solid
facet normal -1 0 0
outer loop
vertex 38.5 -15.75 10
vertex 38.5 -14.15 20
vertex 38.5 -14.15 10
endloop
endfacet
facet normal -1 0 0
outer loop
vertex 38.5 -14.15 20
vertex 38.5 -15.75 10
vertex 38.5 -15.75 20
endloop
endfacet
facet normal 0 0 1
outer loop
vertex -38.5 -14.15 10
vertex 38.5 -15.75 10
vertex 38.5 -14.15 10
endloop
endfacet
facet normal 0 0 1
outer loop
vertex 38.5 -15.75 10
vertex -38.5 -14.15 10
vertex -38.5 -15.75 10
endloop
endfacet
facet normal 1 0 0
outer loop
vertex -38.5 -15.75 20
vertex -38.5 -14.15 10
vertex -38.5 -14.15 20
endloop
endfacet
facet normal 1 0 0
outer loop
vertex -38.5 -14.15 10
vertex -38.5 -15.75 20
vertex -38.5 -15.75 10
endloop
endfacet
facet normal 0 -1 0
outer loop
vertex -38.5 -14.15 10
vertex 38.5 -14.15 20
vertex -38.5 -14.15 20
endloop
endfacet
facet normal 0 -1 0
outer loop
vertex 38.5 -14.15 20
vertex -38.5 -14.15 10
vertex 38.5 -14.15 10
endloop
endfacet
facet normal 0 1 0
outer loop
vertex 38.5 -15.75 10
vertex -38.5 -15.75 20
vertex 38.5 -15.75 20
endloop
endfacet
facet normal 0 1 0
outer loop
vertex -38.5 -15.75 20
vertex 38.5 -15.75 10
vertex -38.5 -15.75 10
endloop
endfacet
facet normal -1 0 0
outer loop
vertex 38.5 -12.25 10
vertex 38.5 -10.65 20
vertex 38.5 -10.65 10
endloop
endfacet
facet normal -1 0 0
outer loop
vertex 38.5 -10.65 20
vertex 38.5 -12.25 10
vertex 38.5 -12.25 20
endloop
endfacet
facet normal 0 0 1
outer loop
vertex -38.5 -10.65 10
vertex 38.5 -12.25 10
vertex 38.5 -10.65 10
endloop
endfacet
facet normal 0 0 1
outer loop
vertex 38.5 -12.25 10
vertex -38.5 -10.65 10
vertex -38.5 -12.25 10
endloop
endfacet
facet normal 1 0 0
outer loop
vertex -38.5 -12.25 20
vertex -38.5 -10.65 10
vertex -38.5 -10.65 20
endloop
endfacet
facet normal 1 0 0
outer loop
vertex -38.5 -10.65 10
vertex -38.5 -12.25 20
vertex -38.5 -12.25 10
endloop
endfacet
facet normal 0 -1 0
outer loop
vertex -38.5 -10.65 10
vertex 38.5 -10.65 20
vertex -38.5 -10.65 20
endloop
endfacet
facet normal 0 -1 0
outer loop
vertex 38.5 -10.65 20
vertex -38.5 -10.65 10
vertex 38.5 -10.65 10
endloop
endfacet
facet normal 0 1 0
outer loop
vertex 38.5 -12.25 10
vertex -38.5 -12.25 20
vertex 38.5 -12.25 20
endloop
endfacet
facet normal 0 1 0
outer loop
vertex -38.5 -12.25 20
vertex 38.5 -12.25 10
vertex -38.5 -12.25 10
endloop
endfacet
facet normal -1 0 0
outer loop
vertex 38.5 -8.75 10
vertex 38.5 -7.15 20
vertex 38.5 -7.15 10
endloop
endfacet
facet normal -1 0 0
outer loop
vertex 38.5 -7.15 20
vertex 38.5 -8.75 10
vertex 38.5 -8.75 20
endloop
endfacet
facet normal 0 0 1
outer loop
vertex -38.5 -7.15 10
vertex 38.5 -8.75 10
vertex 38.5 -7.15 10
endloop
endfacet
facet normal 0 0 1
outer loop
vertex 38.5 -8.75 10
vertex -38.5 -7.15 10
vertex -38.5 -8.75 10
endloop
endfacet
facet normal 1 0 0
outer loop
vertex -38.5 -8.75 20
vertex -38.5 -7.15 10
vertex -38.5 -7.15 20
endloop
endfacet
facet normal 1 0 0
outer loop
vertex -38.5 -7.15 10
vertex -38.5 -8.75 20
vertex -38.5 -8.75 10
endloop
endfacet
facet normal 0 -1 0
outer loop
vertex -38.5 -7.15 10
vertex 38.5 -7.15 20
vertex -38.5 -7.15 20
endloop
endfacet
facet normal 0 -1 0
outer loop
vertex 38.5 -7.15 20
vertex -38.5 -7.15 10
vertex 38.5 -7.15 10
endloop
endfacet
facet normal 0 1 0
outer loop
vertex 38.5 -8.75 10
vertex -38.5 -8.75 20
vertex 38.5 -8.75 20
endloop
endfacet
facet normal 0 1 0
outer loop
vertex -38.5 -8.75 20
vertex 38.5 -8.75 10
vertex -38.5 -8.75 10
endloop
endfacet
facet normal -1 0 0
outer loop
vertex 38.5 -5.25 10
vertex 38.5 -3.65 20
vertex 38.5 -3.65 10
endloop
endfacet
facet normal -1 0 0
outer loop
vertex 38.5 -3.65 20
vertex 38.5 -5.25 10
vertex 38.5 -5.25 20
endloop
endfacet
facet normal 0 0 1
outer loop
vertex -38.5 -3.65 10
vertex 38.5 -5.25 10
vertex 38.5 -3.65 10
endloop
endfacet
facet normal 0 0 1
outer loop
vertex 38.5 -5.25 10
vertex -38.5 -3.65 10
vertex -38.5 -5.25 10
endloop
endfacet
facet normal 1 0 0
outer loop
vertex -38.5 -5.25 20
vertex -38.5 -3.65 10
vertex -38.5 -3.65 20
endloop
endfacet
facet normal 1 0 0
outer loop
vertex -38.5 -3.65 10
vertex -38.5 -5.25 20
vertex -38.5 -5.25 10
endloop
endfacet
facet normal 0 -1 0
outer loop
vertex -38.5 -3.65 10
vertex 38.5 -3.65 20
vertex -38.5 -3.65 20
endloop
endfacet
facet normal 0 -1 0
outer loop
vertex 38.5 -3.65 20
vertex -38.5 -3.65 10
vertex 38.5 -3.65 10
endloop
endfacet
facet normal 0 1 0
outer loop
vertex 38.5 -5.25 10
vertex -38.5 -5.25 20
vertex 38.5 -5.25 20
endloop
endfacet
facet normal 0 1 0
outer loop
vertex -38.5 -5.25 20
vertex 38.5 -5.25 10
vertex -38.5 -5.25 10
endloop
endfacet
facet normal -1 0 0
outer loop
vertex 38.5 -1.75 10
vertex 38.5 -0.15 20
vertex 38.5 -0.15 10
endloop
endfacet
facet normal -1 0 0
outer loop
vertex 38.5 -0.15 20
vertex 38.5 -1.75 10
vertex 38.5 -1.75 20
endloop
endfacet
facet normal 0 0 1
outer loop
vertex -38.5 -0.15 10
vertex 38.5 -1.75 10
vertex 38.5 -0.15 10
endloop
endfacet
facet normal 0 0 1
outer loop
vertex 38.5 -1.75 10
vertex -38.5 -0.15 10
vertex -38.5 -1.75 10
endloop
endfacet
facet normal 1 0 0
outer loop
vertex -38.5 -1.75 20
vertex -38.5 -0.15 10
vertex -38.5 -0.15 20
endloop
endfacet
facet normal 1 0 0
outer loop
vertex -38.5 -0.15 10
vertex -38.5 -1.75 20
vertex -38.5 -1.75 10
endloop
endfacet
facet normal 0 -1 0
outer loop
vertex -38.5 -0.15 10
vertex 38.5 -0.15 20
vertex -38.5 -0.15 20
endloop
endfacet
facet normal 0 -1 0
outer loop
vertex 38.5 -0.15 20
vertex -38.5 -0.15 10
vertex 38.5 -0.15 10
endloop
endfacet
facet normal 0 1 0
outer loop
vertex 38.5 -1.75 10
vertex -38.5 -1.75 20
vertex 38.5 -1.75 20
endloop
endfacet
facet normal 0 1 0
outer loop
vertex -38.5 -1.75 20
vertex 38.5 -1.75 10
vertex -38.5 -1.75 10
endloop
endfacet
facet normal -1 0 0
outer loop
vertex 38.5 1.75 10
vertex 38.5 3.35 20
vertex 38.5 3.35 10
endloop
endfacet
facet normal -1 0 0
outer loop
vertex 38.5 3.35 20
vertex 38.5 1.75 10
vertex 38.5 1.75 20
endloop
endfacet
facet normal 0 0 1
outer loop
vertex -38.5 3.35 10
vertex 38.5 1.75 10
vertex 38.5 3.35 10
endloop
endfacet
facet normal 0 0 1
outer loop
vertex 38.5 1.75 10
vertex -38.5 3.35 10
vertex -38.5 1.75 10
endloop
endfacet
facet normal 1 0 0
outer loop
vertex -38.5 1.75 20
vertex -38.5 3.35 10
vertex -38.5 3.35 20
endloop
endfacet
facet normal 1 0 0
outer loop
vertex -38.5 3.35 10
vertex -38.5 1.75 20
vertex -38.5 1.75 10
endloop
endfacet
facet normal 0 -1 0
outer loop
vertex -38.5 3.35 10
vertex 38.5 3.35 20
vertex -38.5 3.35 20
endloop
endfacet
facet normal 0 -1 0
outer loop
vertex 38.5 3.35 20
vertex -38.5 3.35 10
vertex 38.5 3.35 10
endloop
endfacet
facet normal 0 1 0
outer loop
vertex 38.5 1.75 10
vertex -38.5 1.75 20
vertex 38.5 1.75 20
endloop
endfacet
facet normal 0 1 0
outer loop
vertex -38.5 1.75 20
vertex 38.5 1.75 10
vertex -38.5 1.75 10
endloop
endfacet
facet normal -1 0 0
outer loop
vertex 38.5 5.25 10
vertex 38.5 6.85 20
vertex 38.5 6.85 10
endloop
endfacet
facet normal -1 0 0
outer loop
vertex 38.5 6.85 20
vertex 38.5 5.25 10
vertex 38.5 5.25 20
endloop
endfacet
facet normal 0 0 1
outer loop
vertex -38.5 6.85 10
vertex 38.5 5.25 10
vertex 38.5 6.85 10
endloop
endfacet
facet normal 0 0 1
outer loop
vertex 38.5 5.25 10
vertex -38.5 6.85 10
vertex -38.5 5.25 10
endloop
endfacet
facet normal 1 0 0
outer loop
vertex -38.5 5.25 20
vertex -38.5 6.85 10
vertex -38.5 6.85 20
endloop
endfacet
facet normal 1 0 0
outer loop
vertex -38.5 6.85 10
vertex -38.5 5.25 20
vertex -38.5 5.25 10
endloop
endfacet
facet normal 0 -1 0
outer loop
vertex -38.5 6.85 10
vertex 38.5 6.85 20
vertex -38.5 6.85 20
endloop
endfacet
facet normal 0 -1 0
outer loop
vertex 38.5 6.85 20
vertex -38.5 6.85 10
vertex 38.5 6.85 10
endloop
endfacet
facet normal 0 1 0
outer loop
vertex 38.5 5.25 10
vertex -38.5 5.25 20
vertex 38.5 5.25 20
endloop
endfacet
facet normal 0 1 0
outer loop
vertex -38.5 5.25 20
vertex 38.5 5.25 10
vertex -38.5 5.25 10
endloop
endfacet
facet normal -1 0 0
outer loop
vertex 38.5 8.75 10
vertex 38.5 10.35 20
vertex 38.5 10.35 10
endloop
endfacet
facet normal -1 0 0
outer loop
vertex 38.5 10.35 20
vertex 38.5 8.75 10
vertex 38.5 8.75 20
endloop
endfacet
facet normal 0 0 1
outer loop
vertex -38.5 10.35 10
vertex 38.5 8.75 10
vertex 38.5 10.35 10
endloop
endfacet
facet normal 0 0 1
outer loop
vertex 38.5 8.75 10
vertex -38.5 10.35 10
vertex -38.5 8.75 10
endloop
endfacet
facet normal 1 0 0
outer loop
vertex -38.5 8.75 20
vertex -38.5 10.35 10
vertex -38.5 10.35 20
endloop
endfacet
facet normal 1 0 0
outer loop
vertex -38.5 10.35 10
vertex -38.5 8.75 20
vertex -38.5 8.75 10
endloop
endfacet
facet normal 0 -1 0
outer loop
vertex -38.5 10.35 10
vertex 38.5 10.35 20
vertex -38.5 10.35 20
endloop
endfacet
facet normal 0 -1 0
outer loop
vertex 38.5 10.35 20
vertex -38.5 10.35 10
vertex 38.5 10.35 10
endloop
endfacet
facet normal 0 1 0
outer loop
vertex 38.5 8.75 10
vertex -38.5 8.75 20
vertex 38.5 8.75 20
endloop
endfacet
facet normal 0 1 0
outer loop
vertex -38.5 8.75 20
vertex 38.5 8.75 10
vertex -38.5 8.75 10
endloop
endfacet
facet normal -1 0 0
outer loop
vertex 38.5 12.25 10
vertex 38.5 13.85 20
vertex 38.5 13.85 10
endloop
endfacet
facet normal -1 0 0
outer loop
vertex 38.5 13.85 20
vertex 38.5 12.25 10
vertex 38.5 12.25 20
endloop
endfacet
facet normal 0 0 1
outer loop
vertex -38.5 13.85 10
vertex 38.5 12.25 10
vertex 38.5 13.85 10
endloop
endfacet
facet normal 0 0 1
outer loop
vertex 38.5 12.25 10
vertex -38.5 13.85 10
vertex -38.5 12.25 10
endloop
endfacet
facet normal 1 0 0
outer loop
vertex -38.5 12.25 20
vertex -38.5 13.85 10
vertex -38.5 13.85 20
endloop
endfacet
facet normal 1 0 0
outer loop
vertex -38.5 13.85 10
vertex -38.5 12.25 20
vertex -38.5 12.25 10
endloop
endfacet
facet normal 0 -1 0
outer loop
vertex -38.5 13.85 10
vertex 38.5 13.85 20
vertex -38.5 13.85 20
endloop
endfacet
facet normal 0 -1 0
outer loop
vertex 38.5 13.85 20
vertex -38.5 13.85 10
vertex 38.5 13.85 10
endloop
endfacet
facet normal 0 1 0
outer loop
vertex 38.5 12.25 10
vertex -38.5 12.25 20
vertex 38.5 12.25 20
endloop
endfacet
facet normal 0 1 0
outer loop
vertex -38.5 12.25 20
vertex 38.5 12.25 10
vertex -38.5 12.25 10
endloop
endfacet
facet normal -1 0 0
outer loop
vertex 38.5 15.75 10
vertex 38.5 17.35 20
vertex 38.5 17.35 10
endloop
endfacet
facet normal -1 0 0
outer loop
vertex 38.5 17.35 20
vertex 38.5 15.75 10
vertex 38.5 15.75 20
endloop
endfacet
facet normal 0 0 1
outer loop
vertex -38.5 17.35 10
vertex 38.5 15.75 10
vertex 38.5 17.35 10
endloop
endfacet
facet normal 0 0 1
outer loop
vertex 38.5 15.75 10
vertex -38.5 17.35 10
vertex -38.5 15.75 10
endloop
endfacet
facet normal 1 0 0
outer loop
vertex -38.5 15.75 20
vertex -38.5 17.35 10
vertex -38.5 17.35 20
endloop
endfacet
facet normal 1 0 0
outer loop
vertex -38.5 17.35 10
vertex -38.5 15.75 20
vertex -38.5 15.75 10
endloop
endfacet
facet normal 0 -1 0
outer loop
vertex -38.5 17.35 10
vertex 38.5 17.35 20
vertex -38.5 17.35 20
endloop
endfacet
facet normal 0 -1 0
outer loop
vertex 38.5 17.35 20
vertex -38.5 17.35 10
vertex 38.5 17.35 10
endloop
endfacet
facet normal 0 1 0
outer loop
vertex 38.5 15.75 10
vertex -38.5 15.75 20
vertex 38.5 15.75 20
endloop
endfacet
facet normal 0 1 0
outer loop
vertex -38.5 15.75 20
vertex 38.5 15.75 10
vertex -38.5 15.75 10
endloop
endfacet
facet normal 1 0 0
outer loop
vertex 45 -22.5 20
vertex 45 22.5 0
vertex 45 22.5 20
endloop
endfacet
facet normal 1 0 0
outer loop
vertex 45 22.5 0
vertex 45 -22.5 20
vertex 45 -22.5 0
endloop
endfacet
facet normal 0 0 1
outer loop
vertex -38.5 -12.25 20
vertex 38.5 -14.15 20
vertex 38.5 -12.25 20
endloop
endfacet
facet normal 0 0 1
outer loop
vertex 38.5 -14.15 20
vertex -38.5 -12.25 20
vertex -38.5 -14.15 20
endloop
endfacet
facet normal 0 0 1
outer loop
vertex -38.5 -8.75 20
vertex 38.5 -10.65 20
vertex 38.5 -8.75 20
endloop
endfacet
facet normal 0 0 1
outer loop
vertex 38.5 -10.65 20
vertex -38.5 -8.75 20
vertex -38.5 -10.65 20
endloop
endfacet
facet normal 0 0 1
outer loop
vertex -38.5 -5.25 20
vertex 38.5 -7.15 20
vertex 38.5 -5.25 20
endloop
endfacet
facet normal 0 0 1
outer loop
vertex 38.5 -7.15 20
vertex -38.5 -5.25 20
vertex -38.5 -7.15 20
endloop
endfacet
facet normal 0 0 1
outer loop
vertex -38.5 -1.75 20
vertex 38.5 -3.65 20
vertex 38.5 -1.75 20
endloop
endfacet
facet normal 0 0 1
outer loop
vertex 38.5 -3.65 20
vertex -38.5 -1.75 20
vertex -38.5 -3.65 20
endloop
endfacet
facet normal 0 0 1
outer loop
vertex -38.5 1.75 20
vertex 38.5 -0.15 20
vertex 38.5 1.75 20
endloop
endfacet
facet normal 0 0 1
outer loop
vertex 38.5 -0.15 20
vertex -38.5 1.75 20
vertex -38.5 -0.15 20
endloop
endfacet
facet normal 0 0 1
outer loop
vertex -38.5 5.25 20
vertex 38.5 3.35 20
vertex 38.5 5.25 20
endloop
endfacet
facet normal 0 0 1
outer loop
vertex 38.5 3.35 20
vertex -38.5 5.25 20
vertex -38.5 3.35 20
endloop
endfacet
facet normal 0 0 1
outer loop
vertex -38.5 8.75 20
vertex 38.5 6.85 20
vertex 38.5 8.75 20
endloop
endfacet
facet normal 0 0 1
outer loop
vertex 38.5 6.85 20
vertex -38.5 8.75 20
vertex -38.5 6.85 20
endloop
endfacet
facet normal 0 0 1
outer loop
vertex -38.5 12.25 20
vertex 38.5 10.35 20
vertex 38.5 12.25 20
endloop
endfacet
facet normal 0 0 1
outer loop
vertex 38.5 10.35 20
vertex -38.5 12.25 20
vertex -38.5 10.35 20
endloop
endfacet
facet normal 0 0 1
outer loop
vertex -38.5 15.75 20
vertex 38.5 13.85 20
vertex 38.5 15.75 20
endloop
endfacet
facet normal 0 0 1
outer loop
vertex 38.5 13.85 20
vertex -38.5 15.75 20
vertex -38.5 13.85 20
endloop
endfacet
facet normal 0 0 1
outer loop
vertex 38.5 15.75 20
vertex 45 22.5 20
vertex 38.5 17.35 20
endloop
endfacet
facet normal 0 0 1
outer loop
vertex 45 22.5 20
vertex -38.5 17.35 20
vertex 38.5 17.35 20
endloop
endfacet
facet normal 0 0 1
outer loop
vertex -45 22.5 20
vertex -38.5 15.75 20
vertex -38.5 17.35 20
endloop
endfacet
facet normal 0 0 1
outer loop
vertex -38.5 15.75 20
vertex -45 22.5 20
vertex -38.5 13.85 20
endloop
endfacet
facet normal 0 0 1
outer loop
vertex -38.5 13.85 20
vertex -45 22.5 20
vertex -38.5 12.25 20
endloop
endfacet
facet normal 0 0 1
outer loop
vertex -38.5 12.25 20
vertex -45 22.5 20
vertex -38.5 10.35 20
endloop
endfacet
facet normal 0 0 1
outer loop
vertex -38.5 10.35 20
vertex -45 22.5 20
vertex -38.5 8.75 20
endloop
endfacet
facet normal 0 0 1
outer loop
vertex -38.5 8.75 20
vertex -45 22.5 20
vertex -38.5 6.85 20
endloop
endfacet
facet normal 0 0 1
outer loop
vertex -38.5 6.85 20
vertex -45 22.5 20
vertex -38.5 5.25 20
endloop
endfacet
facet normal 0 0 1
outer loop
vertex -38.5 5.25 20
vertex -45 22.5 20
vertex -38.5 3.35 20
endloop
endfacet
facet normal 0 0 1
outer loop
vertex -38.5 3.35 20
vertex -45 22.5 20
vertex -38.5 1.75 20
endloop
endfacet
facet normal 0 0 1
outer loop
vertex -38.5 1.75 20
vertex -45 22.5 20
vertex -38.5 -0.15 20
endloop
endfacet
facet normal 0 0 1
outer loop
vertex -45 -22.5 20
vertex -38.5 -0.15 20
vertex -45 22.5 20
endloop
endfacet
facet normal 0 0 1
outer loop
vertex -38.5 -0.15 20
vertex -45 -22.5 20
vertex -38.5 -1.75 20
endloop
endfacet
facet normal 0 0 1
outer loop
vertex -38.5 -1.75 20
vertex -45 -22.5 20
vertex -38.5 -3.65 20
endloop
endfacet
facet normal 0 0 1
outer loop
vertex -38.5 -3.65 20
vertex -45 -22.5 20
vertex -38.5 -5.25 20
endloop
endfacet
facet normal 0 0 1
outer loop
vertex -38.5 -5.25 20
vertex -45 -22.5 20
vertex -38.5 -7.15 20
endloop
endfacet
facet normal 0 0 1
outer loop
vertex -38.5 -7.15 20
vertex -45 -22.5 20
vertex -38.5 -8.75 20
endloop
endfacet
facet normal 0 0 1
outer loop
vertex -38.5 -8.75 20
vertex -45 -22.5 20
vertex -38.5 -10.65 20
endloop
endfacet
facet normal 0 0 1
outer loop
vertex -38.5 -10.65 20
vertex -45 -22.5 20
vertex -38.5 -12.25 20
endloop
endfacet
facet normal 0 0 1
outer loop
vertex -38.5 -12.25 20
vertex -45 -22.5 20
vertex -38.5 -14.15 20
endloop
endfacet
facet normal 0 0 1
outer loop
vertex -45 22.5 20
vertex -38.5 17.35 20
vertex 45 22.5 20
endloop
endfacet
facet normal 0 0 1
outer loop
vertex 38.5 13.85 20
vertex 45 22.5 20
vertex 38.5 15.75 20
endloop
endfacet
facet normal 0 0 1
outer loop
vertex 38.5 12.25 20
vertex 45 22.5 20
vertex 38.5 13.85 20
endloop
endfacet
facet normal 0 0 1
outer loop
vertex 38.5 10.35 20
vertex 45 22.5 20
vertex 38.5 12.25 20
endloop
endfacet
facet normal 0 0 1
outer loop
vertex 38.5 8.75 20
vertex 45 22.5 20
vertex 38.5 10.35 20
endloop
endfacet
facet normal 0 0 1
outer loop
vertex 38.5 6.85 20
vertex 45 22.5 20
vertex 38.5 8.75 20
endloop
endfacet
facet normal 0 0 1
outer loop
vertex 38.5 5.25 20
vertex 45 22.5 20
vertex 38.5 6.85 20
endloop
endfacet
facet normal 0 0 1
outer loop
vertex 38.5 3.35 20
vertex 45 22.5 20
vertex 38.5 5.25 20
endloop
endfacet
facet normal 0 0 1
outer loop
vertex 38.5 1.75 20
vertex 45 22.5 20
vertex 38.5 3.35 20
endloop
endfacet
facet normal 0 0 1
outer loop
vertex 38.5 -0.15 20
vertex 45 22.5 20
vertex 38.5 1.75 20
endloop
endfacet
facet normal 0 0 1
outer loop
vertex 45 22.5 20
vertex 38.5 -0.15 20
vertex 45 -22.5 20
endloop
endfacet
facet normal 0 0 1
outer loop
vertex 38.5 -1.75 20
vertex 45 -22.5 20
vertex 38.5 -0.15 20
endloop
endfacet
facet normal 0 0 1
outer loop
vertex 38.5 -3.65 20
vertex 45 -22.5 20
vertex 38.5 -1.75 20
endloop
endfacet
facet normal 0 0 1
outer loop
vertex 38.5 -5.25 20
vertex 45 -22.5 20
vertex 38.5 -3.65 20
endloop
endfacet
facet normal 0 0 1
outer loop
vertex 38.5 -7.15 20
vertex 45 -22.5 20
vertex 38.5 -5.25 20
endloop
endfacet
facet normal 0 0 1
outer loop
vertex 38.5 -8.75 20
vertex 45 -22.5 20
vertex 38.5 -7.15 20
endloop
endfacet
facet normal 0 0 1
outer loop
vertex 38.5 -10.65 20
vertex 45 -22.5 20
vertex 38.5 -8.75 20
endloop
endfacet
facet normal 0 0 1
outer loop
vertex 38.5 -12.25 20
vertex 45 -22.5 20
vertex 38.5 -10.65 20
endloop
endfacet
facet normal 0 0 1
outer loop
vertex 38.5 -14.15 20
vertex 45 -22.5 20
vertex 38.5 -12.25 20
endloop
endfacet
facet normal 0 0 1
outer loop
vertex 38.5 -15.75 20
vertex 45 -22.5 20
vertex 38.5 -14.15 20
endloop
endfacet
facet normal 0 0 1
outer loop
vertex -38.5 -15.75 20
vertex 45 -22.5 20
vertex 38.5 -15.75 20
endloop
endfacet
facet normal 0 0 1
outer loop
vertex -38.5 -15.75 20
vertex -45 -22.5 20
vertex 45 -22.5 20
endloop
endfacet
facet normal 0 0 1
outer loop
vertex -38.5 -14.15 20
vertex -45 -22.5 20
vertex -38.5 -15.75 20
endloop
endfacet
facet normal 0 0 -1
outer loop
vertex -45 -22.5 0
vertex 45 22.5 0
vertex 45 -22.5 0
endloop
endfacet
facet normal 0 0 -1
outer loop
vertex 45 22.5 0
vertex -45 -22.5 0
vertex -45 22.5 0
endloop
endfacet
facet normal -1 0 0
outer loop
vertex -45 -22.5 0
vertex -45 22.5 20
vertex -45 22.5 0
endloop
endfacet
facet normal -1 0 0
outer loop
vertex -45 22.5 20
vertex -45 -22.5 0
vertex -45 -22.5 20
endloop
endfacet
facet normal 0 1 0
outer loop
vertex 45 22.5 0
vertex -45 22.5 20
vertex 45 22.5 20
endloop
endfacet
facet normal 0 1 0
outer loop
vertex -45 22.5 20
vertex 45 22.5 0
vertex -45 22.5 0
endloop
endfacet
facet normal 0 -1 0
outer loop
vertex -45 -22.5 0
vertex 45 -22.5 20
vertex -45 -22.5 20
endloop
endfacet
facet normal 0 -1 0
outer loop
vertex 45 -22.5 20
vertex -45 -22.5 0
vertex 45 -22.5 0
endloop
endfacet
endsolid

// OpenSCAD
// Microscope slide drying rack
// Print orientation: base block on the bed (z = 0), slots open upward.

// ---------------- Parameters ----------------
block_len    = 90;    // base block length along X (mm)
block_wid    = 45;    // base block width along Y (mm)
block_h      = 20;    // base block height along Z (mm)

slot_len     = 77;    // slot length along X (mm)
slot_w       = 1.6;   // slot width along Y (mm)
slot_depth   = 10;    // slot depth from top face (mm)
slot_count   = 10;    // number of slots
slot_pitch   = 3.5;   // centre-to-centre slot spacing along Y (mm)

eps          = 0.5;   // overcut past the top face to avoid coplanar faces (mm)

$fn = 64;

// ---------------- Model ----------------
difference() {
    // Base block, centred in X and Y, sitting on z = 0
    translate([-block_len / 2, -block_wid / 2, 0])
        cube([block_len, block_wid, block_h]);

    // Slot group, centred on the block in X and Y
    for (i = [0 : slot_count - 1]) {
        y = (i - (slot_count - 1) / 2) * slot_pitch;
        translate([-slot_len / 2, y, block_h - slot_depth])
            cube([slot_len, slot_w, slot_depth + eps]);
    }
}
